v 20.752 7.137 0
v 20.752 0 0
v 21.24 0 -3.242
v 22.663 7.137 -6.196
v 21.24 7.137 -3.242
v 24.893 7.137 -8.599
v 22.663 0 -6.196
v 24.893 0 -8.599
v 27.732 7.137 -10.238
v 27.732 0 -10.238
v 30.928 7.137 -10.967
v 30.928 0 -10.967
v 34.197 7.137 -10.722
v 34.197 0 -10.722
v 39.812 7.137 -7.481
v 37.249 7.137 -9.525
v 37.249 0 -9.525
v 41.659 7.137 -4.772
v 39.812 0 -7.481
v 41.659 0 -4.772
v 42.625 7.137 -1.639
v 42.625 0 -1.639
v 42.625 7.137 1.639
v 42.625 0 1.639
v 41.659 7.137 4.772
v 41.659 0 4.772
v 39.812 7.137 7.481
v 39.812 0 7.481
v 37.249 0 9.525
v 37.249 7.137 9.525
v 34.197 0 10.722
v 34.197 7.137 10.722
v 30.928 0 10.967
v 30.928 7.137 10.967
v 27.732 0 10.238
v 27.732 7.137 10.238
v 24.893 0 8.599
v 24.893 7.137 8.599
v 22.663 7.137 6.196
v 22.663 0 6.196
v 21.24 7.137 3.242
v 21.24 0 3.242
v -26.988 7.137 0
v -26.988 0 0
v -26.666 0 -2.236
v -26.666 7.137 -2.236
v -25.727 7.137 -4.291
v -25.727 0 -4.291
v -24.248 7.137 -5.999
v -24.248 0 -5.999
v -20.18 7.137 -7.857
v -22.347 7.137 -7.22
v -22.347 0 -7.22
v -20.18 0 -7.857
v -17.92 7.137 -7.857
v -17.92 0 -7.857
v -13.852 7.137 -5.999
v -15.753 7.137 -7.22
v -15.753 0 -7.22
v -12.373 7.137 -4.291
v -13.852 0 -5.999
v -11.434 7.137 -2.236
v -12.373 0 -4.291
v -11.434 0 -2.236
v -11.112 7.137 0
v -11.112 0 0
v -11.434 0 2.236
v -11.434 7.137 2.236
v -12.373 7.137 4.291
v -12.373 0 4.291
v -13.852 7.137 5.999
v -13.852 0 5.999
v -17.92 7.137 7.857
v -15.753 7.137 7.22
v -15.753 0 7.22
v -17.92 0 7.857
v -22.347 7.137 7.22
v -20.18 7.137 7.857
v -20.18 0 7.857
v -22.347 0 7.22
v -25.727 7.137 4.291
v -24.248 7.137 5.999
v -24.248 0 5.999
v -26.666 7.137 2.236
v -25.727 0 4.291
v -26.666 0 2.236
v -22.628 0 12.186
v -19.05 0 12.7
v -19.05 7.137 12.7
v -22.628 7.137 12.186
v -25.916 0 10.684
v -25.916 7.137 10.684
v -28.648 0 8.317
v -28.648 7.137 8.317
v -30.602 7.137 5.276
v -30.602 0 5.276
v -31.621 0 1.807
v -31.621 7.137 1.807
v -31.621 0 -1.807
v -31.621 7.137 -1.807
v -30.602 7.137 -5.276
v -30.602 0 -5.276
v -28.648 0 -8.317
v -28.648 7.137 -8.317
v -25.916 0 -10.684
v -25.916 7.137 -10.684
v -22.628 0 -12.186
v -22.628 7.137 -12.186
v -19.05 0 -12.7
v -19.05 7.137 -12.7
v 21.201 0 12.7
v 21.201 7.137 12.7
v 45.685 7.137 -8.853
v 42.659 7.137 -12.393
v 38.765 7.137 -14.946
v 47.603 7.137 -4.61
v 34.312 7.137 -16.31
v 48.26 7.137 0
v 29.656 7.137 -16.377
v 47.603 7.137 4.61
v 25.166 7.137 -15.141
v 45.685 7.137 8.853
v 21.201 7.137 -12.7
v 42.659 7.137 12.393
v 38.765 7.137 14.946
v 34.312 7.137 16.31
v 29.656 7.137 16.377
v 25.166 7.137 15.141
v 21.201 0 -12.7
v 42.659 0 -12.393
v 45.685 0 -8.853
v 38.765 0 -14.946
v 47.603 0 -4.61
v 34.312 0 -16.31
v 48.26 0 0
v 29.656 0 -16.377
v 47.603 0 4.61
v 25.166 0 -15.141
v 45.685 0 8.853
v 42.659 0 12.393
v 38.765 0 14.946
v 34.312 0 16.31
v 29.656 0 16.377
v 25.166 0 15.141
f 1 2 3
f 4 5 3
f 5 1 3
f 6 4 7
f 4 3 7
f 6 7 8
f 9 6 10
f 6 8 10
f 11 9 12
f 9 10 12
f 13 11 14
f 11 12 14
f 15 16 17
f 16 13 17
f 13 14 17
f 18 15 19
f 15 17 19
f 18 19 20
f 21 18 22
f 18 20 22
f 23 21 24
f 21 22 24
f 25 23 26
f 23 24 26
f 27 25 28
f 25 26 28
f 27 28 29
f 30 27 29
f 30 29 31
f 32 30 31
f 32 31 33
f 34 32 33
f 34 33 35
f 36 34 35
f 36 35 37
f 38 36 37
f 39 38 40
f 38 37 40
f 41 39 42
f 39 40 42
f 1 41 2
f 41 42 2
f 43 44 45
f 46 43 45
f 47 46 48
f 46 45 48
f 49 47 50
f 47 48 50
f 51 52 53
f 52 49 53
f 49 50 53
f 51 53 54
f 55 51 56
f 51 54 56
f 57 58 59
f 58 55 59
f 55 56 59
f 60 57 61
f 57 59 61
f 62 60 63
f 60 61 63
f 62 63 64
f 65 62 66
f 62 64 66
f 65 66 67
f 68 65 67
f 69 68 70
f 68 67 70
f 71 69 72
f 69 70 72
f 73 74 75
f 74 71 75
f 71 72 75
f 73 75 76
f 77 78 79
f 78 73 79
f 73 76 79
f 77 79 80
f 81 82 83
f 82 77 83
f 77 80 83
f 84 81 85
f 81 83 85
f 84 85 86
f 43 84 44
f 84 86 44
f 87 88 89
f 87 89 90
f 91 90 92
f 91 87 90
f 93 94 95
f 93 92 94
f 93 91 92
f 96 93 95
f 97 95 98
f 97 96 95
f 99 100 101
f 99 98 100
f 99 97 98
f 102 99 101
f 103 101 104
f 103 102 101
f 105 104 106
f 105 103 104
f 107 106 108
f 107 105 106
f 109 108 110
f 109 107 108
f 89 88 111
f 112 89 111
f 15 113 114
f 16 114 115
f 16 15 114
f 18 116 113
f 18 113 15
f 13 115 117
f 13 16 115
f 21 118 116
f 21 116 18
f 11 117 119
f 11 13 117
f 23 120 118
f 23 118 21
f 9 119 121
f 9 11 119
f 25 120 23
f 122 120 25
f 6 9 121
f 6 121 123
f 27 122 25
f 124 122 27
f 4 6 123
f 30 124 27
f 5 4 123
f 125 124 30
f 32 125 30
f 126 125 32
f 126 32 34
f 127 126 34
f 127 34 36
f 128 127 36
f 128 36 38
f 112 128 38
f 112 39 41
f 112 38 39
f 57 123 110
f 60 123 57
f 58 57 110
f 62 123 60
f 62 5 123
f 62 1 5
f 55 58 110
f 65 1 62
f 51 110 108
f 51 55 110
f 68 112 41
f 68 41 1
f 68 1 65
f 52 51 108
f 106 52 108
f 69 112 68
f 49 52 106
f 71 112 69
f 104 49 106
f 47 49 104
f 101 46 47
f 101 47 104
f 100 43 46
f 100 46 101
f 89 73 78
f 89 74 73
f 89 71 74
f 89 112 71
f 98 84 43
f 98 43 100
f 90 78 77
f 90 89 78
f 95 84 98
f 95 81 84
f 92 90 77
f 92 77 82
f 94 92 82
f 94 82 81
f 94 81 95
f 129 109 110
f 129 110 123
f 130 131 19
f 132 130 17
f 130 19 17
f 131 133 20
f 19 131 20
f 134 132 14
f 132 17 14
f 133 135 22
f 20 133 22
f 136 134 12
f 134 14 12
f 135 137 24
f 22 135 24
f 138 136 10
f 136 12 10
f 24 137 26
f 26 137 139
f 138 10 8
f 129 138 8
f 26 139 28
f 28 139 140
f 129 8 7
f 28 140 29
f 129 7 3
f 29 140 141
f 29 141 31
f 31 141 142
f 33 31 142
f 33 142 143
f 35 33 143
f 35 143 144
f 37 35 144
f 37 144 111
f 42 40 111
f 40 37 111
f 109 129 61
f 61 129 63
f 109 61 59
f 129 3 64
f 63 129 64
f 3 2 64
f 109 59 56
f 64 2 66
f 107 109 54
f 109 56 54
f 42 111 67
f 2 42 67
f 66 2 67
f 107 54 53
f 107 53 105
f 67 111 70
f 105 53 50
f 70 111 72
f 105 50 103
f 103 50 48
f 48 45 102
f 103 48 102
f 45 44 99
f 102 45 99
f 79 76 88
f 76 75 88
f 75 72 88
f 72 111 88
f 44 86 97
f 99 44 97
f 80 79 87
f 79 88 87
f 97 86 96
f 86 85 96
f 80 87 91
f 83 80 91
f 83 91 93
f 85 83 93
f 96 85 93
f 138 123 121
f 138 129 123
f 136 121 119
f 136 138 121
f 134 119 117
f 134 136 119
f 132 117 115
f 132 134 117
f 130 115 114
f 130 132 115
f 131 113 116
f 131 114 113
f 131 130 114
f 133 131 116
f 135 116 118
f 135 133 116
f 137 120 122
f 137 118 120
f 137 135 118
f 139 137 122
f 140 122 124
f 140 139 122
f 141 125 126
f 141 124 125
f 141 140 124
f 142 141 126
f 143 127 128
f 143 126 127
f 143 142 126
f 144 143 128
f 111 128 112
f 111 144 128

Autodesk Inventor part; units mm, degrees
ref_plane "YZ Plane" through (0, 0, 0) normal (1, 0, 0) x (0, 1, 0)
ref_plane "XZ Plane" through (0, 0, 0) normal (0, 1, 0) x (-1, 0, 0)
ref_plane "XY Plane" through (0, 0, 0) normal (0, 0, 1) x (1, 0, 0)
sketch "Sketch1" plane through (0, 0, 0) normal (0, 1, 0) x (-1, 0, 0)
  arc A0 (19.05, -12.7) -> (19.05, 12.7) centre (19.05, 0) ccw
  arc A1 (-21.2006, 12.7) -> (-21.2006, -12.7) centre (-31.75, 0) ccw
  circle A2 centre (-31.75, 0) radius 10.9982
  circle A3 centre (19.05, 0) radius 7.9375
  line L0 (19.05, -12.7) -> (-24.3756, -12.7)
  line L1 (19.05, 12.7) -> (-24.3756, 12.7)
  line L2 (-31.75, 0) -> (19.05, 0)
  point P0 (0, 0)
  point P1 (-21.2006, 12.7)
  dimension "d4" = 15.875
  dimension "d9" = 50.8
extrude "Extrusion1" add sketch "Sketch1" along normal blind 7.1374
properties part number "Connecting Rod"
